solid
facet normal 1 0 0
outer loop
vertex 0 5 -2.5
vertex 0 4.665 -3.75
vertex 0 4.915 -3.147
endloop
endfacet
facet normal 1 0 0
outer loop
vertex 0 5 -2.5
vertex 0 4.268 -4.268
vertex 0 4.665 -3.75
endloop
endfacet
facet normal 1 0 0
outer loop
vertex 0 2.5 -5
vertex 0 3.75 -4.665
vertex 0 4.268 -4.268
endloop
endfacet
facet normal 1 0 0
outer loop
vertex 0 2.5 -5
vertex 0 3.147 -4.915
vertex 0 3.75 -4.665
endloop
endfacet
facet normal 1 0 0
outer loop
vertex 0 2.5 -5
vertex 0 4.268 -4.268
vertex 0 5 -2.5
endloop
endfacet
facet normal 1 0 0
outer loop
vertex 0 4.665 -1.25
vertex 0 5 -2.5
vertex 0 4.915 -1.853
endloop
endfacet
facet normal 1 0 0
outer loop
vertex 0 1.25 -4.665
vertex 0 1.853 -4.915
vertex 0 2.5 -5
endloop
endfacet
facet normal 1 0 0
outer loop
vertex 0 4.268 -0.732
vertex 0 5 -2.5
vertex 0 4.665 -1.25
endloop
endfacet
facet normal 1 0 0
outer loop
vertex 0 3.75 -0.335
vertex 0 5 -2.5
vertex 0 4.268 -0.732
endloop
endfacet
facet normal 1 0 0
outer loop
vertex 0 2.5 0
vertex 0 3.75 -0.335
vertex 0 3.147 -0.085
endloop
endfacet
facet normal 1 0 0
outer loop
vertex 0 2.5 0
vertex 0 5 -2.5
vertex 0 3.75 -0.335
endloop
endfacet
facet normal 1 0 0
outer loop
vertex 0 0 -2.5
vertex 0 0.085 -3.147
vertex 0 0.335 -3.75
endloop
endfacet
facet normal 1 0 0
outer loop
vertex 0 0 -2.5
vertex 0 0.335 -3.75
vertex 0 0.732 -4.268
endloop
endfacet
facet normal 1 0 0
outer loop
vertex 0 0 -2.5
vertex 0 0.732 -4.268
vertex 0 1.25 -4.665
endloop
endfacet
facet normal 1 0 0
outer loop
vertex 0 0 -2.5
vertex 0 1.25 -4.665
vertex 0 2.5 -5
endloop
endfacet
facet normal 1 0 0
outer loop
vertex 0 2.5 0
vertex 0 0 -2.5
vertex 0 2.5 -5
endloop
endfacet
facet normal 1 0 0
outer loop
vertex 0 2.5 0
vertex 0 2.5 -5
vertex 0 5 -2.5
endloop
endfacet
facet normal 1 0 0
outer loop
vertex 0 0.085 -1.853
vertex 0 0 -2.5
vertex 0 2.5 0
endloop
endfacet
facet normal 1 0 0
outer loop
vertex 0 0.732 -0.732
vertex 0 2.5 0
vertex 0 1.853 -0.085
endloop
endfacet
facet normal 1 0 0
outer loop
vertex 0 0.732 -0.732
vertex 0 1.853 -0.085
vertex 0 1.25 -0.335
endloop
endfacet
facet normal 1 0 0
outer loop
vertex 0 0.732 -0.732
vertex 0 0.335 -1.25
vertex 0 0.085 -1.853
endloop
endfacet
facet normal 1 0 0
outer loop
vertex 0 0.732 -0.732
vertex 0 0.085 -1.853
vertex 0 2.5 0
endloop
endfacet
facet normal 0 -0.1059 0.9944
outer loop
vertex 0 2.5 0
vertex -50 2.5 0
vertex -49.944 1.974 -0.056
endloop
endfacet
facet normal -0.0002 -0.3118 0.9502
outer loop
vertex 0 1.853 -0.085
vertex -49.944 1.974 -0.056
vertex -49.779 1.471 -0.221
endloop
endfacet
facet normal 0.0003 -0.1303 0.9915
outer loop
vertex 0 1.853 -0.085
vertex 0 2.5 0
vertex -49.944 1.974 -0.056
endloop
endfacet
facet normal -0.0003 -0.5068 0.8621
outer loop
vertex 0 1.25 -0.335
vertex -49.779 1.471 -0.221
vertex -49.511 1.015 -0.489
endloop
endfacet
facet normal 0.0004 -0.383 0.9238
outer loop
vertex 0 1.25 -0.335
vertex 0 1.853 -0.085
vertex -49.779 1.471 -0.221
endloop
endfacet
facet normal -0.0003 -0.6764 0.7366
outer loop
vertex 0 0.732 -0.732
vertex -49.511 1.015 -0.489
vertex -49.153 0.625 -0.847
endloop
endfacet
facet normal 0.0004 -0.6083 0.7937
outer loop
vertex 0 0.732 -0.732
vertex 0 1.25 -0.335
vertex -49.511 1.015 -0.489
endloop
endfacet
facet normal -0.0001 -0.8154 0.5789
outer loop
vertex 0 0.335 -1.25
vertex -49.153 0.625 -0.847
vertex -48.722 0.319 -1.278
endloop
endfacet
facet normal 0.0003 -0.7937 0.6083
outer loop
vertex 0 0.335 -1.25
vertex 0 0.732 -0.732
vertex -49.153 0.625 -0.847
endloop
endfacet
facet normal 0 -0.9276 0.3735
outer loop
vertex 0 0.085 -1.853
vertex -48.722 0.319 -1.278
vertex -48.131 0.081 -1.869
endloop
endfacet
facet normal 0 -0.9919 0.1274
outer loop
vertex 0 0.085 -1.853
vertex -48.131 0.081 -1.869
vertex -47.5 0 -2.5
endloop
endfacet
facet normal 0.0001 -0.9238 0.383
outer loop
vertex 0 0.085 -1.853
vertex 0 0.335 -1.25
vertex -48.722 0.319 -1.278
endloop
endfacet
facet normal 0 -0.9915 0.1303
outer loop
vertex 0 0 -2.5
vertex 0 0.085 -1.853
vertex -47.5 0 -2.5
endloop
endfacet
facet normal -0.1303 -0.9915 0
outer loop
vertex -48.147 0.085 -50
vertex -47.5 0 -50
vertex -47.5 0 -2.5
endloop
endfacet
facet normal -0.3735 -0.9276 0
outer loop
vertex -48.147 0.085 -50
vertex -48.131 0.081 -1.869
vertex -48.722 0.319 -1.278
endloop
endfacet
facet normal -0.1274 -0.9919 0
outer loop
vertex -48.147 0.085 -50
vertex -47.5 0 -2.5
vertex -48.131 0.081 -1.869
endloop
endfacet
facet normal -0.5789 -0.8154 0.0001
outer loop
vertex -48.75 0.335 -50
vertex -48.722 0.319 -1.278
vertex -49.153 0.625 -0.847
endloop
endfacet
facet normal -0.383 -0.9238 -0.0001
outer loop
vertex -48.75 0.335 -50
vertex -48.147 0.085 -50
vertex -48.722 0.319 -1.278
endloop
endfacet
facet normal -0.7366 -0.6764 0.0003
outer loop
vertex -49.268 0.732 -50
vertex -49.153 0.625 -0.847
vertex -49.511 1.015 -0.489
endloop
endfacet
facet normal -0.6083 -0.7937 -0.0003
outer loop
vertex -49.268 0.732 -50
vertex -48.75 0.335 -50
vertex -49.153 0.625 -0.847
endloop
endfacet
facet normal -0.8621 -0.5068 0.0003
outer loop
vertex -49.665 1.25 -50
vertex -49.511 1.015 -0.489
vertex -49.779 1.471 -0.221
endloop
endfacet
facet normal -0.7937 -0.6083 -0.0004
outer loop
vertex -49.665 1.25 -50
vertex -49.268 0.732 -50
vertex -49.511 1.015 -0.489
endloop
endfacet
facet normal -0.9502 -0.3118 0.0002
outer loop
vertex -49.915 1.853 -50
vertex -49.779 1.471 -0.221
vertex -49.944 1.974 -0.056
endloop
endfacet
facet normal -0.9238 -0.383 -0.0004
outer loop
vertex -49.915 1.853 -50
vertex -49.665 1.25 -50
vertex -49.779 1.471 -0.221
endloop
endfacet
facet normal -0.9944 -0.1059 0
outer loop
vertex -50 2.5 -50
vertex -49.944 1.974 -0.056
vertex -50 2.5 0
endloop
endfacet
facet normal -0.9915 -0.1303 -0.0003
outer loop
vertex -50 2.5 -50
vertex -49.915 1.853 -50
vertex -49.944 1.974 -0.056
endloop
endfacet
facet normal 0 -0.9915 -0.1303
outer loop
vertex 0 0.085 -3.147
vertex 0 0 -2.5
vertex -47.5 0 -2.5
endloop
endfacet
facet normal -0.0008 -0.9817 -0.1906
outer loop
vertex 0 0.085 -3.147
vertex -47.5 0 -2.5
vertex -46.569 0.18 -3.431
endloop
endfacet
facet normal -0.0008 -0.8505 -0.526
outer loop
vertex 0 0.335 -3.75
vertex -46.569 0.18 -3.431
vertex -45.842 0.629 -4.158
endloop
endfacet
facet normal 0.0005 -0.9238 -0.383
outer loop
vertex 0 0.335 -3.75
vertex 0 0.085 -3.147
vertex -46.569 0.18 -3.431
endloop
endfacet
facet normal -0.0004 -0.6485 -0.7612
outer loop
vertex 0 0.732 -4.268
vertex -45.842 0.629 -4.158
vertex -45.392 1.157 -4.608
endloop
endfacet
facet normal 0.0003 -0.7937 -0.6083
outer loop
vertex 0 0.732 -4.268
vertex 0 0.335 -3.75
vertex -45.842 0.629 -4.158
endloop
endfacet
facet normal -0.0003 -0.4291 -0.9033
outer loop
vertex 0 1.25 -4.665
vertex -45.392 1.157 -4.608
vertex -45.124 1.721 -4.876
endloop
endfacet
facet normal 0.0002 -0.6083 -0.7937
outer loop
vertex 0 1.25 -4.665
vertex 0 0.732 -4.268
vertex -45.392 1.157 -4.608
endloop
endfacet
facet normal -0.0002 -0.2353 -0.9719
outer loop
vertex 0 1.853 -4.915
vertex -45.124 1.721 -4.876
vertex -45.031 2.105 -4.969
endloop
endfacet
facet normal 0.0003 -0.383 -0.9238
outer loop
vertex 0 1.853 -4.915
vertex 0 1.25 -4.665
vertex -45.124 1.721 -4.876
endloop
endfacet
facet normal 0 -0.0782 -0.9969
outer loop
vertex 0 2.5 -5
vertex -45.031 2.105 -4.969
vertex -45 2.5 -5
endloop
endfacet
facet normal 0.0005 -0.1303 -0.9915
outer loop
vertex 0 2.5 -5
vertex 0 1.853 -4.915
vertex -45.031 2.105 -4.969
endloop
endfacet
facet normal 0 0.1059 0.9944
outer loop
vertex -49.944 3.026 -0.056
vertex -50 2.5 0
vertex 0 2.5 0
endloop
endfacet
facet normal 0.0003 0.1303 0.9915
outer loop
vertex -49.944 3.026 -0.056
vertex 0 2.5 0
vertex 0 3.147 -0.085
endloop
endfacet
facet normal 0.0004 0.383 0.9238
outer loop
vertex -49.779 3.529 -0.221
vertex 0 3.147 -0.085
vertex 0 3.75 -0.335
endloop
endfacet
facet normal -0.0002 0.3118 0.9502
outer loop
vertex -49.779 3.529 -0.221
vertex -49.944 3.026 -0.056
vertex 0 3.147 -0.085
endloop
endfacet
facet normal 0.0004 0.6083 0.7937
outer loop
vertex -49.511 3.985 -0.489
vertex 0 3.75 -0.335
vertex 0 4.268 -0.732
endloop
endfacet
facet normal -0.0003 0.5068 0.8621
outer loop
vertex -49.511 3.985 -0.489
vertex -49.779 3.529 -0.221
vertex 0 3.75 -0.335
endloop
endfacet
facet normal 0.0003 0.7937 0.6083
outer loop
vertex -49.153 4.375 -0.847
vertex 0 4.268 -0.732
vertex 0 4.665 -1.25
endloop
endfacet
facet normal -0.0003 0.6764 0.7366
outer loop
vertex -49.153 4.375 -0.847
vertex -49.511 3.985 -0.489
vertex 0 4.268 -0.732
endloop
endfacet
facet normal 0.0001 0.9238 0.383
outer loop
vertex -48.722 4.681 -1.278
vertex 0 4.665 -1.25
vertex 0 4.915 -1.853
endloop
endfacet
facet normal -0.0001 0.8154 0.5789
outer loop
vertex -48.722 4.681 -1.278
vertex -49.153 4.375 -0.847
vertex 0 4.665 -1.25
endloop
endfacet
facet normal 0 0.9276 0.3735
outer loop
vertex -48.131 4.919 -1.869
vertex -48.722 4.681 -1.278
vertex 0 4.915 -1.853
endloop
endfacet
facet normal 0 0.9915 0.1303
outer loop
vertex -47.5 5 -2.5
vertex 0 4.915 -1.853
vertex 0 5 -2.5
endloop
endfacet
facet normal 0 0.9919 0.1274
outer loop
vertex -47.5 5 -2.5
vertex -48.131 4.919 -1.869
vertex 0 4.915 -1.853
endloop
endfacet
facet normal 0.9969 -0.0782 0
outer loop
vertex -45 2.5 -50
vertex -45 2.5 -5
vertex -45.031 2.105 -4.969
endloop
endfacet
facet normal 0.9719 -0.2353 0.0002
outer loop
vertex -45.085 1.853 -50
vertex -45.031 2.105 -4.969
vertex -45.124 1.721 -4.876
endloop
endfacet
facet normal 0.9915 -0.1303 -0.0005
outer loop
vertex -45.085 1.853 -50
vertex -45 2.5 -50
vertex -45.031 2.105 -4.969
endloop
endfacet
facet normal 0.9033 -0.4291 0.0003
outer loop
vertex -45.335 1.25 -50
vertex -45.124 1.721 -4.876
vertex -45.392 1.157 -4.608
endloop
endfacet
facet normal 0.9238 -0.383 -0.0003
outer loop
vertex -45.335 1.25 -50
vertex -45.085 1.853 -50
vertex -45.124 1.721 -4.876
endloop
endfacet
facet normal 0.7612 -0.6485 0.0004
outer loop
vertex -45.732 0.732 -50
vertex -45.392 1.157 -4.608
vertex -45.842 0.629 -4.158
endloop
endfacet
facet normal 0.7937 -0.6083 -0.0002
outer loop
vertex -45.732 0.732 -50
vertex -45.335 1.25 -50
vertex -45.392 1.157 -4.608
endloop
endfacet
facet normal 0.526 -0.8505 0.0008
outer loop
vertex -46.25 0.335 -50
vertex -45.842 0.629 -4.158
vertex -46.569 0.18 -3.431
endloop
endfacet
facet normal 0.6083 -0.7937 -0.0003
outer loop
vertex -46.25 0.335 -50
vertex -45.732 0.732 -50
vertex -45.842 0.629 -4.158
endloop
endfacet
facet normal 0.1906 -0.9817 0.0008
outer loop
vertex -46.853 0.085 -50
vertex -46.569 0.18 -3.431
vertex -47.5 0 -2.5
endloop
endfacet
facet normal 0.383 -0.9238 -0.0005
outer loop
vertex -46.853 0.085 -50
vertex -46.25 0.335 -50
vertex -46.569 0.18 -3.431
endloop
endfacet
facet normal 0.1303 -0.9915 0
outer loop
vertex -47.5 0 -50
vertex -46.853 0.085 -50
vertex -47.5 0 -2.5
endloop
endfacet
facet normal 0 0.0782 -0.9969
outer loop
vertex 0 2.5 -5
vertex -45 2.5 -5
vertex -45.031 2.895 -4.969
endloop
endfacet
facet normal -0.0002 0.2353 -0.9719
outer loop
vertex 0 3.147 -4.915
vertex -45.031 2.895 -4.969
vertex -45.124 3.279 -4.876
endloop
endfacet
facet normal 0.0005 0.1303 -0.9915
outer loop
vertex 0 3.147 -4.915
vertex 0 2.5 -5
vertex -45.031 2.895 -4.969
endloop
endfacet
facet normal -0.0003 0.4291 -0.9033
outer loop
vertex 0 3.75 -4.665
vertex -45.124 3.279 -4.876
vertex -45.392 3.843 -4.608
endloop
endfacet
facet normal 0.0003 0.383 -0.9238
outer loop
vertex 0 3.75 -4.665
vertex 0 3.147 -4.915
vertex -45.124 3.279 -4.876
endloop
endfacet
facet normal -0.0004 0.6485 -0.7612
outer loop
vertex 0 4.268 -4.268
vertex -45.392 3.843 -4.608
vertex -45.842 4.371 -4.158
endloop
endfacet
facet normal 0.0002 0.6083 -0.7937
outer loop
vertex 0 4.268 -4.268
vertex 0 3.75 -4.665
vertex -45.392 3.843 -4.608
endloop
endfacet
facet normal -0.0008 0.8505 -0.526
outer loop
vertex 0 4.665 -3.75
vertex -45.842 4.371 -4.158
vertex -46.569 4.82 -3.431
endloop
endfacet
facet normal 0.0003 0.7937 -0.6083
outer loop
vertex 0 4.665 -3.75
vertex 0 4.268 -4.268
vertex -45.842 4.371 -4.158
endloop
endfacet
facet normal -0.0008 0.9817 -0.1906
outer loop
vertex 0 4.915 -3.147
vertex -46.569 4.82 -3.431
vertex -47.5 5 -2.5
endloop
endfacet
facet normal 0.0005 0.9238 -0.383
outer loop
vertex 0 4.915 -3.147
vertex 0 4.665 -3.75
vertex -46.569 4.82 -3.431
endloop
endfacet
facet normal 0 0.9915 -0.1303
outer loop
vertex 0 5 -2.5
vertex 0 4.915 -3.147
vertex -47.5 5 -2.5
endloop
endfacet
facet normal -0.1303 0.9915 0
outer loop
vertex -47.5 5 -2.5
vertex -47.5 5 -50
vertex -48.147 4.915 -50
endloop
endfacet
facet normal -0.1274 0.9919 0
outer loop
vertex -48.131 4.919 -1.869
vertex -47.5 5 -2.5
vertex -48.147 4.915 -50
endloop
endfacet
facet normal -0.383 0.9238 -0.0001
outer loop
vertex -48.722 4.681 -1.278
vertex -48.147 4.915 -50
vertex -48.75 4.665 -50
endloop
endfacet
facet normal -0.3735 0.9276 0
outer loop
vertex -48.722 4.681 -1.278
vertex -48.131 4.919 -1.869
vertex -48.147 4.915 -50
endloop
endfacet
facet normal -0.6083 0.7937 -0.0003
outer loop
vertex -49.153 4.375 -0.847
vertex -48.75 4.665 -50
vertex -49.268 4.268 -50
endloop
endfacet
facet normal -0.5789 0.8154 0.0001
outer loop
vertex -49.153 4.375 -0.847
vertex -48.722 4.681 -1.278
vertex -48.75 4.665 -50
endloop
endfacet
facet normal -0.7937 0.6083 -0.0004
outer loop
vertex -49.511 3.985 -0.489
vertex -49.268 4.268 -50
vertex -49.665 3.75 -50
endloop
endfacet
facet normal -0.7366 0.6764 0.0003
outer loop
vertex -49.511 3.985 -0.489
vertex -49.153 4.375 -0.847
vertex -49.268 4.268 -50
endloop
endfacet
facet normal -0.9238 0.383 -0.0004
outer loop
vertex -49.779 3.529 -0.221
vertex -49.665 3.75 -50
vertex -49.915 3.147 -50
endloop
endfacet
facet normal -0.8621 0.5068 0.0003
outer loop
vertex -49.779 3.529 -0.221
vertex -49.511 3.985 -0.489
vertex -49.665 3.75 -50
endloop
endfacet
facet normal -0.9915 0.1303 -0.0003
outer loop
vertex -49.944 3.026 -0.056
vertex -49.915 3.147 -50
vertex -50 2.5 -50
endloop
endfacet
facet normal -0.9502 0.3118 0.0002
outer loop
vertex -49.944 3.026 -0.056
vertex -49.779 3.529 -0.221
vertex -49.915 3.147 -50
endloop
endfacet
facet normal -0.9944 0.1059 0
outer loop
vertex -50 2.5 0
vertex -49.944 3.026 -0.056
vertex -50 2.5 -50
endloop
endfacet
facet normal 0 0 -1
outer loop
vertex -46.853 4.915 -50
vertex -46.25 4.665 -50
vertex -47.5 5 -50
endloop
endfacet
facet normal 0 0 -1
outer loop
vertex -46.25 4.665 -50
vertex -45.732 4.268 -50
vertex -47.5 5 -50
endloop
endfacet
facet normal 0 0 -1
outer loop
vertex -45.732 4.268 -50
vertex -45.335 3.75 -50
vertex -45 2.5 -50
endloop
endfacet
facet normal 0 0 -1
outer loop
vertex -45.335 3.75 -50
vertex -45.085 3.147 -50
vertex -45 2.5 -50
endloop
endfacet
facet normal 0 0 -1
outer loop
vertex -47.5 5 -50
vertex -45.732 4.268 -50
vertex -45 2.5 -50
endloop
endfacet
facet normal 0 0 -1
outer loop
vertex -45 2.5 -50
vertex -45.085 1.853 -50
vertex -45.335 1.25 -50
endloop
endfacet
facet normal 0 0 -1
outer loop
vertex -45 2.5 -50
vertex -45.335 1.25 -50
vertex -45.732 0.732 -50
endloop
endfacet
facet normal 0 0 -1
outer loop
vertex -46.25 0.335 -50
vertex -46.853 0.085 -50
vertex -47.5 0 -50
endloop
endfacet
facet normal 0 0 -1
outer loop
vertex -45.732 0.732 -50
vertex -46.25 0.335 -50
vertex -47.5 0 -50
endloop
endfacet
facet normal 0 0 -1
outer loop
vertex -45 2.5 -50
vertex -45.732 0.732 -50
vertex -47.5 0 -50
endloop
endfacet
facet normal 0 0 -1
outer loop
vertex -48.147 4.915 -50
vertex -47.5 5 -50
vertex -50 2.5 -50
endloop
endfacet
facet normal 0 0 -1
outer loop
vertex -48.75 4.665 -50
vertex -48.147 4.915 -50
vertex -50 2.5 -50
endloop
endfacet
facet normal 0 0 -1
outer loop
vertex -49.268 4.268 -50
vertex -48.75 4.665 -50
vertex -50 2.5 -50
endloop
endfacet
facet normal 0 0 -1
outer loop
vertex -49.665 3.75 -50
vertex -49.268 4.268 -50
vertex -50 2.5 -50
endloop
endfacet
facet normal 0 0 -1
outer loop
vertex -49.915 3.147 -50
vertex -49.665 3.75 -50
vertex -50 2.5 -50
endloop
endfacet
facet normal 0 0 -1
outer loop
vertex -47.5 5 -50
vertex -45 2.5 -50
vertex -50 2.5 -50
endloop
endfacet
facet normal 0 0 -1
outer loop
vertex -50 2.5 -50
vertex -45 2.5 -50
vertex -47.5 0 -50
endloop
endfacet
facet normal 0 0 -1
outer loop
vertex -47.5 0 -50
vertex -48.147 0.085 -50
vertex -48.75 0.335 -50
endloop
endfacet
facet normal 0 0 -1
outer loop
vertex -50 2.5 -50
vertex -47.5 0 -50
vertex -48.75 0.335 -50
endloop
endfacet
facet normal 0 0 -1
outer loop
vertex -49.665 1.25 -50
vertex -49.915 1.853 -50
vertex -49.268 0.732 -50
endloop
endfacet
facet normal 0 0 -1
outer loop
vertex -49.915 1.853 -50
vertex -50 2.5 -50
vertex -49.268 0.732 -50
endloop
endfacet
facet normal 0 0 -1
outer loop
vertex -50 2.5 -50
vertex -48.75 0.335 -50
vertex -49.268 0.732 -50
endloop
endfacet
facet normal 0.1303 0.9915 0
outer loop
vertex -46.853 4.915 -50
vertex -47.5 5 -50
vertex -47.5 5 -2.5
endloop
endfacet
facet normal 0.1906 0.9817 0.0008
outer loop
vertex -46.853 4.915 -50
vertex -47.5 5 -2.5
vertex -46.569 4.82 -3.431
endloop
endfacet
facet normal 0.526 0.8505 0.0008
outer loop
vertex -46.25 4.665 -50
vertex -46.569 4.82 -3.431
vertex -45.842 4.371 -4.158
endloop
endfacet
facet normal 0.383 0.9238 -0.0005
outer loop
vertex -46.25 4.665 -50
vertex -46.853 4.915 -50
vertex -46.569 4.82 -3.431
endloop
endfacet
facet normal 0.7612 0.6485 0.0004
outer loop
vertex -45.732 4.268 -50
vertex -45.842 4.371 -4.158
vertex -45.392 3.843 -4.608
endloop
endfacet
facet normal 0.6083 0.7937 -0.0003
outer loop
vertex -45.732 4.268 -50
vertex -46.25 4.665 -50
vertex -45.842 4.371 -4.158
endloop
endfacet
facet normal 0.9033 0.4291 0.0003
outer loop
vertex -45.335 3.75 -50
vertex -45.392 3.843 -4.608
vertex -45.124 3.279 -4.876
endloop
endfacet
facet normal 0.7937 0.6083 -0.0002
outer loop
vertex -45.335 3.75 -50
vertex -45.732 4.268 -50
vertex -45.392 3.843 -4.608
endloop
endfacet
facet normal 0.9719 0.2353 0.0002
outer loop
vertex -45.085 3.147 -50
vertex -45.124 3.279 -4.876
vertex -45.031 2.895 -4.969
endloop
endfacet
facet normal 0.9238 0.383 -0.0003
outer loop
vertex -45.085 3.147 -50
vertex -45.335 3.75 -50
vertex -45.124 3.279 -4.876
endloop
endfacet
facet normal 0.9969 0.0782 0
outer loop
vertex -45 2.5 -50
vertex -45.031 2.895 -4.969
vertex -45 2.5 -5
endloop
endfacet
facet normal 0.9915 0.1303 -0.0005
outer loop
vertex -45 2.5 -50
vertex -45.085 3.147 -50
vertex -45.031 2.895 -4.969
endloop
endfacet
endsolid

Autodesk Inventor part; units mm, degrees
ref_plane "YZ Plane" through (0, 0, 0) normal (1, 0, 0) x (0, 1, 0)
ref_plane "XZ Plane" through (0, 0, 0) normal (0, 1, 0) x (-1, 0, 0)
ref_plane "XY Plane" through (0, 0, 0) normal (0, 0, 1) x (1, 0, 0)
sketch "Sketch1" plane through (0, 0, 0) normal (0, 1, 0) x (-1, 0, 0)
  line L0 (0, 0) -> (50, 0)
  line L1 (50, 0) -> (50, -5)
  line L2 (50, -5) -> (0, -5)
  line L3 (0, -5) -> (0, 0)
  line L4 (50, 0) -> (45, 0)
  line L5 (45, 0) -> (45, -50)
  line L6 (45, -50) -> (50, -50)
  line L7 (50, -50) -> (50, 0)
  point P0 (45, -5)
  dimension "d0" = 50
  dimension "d1" = 5
  dimension "d2" = 5
  dimension "d3" = 50
extrude "Extrusion1" add sketch "Sketch1" along normal blind 5
fillet "Fillet1" radius 2.5 8 edges at (-25, 5, 0) (-50, 5, -2.5) (-25, 0, 0) (-50, 0, -2.5) (-45, 0, -27.5) (-45, 5, -27.5) (-22.5, 5, -5) (-22.5, 0, -5)
properties part number "palanca"
